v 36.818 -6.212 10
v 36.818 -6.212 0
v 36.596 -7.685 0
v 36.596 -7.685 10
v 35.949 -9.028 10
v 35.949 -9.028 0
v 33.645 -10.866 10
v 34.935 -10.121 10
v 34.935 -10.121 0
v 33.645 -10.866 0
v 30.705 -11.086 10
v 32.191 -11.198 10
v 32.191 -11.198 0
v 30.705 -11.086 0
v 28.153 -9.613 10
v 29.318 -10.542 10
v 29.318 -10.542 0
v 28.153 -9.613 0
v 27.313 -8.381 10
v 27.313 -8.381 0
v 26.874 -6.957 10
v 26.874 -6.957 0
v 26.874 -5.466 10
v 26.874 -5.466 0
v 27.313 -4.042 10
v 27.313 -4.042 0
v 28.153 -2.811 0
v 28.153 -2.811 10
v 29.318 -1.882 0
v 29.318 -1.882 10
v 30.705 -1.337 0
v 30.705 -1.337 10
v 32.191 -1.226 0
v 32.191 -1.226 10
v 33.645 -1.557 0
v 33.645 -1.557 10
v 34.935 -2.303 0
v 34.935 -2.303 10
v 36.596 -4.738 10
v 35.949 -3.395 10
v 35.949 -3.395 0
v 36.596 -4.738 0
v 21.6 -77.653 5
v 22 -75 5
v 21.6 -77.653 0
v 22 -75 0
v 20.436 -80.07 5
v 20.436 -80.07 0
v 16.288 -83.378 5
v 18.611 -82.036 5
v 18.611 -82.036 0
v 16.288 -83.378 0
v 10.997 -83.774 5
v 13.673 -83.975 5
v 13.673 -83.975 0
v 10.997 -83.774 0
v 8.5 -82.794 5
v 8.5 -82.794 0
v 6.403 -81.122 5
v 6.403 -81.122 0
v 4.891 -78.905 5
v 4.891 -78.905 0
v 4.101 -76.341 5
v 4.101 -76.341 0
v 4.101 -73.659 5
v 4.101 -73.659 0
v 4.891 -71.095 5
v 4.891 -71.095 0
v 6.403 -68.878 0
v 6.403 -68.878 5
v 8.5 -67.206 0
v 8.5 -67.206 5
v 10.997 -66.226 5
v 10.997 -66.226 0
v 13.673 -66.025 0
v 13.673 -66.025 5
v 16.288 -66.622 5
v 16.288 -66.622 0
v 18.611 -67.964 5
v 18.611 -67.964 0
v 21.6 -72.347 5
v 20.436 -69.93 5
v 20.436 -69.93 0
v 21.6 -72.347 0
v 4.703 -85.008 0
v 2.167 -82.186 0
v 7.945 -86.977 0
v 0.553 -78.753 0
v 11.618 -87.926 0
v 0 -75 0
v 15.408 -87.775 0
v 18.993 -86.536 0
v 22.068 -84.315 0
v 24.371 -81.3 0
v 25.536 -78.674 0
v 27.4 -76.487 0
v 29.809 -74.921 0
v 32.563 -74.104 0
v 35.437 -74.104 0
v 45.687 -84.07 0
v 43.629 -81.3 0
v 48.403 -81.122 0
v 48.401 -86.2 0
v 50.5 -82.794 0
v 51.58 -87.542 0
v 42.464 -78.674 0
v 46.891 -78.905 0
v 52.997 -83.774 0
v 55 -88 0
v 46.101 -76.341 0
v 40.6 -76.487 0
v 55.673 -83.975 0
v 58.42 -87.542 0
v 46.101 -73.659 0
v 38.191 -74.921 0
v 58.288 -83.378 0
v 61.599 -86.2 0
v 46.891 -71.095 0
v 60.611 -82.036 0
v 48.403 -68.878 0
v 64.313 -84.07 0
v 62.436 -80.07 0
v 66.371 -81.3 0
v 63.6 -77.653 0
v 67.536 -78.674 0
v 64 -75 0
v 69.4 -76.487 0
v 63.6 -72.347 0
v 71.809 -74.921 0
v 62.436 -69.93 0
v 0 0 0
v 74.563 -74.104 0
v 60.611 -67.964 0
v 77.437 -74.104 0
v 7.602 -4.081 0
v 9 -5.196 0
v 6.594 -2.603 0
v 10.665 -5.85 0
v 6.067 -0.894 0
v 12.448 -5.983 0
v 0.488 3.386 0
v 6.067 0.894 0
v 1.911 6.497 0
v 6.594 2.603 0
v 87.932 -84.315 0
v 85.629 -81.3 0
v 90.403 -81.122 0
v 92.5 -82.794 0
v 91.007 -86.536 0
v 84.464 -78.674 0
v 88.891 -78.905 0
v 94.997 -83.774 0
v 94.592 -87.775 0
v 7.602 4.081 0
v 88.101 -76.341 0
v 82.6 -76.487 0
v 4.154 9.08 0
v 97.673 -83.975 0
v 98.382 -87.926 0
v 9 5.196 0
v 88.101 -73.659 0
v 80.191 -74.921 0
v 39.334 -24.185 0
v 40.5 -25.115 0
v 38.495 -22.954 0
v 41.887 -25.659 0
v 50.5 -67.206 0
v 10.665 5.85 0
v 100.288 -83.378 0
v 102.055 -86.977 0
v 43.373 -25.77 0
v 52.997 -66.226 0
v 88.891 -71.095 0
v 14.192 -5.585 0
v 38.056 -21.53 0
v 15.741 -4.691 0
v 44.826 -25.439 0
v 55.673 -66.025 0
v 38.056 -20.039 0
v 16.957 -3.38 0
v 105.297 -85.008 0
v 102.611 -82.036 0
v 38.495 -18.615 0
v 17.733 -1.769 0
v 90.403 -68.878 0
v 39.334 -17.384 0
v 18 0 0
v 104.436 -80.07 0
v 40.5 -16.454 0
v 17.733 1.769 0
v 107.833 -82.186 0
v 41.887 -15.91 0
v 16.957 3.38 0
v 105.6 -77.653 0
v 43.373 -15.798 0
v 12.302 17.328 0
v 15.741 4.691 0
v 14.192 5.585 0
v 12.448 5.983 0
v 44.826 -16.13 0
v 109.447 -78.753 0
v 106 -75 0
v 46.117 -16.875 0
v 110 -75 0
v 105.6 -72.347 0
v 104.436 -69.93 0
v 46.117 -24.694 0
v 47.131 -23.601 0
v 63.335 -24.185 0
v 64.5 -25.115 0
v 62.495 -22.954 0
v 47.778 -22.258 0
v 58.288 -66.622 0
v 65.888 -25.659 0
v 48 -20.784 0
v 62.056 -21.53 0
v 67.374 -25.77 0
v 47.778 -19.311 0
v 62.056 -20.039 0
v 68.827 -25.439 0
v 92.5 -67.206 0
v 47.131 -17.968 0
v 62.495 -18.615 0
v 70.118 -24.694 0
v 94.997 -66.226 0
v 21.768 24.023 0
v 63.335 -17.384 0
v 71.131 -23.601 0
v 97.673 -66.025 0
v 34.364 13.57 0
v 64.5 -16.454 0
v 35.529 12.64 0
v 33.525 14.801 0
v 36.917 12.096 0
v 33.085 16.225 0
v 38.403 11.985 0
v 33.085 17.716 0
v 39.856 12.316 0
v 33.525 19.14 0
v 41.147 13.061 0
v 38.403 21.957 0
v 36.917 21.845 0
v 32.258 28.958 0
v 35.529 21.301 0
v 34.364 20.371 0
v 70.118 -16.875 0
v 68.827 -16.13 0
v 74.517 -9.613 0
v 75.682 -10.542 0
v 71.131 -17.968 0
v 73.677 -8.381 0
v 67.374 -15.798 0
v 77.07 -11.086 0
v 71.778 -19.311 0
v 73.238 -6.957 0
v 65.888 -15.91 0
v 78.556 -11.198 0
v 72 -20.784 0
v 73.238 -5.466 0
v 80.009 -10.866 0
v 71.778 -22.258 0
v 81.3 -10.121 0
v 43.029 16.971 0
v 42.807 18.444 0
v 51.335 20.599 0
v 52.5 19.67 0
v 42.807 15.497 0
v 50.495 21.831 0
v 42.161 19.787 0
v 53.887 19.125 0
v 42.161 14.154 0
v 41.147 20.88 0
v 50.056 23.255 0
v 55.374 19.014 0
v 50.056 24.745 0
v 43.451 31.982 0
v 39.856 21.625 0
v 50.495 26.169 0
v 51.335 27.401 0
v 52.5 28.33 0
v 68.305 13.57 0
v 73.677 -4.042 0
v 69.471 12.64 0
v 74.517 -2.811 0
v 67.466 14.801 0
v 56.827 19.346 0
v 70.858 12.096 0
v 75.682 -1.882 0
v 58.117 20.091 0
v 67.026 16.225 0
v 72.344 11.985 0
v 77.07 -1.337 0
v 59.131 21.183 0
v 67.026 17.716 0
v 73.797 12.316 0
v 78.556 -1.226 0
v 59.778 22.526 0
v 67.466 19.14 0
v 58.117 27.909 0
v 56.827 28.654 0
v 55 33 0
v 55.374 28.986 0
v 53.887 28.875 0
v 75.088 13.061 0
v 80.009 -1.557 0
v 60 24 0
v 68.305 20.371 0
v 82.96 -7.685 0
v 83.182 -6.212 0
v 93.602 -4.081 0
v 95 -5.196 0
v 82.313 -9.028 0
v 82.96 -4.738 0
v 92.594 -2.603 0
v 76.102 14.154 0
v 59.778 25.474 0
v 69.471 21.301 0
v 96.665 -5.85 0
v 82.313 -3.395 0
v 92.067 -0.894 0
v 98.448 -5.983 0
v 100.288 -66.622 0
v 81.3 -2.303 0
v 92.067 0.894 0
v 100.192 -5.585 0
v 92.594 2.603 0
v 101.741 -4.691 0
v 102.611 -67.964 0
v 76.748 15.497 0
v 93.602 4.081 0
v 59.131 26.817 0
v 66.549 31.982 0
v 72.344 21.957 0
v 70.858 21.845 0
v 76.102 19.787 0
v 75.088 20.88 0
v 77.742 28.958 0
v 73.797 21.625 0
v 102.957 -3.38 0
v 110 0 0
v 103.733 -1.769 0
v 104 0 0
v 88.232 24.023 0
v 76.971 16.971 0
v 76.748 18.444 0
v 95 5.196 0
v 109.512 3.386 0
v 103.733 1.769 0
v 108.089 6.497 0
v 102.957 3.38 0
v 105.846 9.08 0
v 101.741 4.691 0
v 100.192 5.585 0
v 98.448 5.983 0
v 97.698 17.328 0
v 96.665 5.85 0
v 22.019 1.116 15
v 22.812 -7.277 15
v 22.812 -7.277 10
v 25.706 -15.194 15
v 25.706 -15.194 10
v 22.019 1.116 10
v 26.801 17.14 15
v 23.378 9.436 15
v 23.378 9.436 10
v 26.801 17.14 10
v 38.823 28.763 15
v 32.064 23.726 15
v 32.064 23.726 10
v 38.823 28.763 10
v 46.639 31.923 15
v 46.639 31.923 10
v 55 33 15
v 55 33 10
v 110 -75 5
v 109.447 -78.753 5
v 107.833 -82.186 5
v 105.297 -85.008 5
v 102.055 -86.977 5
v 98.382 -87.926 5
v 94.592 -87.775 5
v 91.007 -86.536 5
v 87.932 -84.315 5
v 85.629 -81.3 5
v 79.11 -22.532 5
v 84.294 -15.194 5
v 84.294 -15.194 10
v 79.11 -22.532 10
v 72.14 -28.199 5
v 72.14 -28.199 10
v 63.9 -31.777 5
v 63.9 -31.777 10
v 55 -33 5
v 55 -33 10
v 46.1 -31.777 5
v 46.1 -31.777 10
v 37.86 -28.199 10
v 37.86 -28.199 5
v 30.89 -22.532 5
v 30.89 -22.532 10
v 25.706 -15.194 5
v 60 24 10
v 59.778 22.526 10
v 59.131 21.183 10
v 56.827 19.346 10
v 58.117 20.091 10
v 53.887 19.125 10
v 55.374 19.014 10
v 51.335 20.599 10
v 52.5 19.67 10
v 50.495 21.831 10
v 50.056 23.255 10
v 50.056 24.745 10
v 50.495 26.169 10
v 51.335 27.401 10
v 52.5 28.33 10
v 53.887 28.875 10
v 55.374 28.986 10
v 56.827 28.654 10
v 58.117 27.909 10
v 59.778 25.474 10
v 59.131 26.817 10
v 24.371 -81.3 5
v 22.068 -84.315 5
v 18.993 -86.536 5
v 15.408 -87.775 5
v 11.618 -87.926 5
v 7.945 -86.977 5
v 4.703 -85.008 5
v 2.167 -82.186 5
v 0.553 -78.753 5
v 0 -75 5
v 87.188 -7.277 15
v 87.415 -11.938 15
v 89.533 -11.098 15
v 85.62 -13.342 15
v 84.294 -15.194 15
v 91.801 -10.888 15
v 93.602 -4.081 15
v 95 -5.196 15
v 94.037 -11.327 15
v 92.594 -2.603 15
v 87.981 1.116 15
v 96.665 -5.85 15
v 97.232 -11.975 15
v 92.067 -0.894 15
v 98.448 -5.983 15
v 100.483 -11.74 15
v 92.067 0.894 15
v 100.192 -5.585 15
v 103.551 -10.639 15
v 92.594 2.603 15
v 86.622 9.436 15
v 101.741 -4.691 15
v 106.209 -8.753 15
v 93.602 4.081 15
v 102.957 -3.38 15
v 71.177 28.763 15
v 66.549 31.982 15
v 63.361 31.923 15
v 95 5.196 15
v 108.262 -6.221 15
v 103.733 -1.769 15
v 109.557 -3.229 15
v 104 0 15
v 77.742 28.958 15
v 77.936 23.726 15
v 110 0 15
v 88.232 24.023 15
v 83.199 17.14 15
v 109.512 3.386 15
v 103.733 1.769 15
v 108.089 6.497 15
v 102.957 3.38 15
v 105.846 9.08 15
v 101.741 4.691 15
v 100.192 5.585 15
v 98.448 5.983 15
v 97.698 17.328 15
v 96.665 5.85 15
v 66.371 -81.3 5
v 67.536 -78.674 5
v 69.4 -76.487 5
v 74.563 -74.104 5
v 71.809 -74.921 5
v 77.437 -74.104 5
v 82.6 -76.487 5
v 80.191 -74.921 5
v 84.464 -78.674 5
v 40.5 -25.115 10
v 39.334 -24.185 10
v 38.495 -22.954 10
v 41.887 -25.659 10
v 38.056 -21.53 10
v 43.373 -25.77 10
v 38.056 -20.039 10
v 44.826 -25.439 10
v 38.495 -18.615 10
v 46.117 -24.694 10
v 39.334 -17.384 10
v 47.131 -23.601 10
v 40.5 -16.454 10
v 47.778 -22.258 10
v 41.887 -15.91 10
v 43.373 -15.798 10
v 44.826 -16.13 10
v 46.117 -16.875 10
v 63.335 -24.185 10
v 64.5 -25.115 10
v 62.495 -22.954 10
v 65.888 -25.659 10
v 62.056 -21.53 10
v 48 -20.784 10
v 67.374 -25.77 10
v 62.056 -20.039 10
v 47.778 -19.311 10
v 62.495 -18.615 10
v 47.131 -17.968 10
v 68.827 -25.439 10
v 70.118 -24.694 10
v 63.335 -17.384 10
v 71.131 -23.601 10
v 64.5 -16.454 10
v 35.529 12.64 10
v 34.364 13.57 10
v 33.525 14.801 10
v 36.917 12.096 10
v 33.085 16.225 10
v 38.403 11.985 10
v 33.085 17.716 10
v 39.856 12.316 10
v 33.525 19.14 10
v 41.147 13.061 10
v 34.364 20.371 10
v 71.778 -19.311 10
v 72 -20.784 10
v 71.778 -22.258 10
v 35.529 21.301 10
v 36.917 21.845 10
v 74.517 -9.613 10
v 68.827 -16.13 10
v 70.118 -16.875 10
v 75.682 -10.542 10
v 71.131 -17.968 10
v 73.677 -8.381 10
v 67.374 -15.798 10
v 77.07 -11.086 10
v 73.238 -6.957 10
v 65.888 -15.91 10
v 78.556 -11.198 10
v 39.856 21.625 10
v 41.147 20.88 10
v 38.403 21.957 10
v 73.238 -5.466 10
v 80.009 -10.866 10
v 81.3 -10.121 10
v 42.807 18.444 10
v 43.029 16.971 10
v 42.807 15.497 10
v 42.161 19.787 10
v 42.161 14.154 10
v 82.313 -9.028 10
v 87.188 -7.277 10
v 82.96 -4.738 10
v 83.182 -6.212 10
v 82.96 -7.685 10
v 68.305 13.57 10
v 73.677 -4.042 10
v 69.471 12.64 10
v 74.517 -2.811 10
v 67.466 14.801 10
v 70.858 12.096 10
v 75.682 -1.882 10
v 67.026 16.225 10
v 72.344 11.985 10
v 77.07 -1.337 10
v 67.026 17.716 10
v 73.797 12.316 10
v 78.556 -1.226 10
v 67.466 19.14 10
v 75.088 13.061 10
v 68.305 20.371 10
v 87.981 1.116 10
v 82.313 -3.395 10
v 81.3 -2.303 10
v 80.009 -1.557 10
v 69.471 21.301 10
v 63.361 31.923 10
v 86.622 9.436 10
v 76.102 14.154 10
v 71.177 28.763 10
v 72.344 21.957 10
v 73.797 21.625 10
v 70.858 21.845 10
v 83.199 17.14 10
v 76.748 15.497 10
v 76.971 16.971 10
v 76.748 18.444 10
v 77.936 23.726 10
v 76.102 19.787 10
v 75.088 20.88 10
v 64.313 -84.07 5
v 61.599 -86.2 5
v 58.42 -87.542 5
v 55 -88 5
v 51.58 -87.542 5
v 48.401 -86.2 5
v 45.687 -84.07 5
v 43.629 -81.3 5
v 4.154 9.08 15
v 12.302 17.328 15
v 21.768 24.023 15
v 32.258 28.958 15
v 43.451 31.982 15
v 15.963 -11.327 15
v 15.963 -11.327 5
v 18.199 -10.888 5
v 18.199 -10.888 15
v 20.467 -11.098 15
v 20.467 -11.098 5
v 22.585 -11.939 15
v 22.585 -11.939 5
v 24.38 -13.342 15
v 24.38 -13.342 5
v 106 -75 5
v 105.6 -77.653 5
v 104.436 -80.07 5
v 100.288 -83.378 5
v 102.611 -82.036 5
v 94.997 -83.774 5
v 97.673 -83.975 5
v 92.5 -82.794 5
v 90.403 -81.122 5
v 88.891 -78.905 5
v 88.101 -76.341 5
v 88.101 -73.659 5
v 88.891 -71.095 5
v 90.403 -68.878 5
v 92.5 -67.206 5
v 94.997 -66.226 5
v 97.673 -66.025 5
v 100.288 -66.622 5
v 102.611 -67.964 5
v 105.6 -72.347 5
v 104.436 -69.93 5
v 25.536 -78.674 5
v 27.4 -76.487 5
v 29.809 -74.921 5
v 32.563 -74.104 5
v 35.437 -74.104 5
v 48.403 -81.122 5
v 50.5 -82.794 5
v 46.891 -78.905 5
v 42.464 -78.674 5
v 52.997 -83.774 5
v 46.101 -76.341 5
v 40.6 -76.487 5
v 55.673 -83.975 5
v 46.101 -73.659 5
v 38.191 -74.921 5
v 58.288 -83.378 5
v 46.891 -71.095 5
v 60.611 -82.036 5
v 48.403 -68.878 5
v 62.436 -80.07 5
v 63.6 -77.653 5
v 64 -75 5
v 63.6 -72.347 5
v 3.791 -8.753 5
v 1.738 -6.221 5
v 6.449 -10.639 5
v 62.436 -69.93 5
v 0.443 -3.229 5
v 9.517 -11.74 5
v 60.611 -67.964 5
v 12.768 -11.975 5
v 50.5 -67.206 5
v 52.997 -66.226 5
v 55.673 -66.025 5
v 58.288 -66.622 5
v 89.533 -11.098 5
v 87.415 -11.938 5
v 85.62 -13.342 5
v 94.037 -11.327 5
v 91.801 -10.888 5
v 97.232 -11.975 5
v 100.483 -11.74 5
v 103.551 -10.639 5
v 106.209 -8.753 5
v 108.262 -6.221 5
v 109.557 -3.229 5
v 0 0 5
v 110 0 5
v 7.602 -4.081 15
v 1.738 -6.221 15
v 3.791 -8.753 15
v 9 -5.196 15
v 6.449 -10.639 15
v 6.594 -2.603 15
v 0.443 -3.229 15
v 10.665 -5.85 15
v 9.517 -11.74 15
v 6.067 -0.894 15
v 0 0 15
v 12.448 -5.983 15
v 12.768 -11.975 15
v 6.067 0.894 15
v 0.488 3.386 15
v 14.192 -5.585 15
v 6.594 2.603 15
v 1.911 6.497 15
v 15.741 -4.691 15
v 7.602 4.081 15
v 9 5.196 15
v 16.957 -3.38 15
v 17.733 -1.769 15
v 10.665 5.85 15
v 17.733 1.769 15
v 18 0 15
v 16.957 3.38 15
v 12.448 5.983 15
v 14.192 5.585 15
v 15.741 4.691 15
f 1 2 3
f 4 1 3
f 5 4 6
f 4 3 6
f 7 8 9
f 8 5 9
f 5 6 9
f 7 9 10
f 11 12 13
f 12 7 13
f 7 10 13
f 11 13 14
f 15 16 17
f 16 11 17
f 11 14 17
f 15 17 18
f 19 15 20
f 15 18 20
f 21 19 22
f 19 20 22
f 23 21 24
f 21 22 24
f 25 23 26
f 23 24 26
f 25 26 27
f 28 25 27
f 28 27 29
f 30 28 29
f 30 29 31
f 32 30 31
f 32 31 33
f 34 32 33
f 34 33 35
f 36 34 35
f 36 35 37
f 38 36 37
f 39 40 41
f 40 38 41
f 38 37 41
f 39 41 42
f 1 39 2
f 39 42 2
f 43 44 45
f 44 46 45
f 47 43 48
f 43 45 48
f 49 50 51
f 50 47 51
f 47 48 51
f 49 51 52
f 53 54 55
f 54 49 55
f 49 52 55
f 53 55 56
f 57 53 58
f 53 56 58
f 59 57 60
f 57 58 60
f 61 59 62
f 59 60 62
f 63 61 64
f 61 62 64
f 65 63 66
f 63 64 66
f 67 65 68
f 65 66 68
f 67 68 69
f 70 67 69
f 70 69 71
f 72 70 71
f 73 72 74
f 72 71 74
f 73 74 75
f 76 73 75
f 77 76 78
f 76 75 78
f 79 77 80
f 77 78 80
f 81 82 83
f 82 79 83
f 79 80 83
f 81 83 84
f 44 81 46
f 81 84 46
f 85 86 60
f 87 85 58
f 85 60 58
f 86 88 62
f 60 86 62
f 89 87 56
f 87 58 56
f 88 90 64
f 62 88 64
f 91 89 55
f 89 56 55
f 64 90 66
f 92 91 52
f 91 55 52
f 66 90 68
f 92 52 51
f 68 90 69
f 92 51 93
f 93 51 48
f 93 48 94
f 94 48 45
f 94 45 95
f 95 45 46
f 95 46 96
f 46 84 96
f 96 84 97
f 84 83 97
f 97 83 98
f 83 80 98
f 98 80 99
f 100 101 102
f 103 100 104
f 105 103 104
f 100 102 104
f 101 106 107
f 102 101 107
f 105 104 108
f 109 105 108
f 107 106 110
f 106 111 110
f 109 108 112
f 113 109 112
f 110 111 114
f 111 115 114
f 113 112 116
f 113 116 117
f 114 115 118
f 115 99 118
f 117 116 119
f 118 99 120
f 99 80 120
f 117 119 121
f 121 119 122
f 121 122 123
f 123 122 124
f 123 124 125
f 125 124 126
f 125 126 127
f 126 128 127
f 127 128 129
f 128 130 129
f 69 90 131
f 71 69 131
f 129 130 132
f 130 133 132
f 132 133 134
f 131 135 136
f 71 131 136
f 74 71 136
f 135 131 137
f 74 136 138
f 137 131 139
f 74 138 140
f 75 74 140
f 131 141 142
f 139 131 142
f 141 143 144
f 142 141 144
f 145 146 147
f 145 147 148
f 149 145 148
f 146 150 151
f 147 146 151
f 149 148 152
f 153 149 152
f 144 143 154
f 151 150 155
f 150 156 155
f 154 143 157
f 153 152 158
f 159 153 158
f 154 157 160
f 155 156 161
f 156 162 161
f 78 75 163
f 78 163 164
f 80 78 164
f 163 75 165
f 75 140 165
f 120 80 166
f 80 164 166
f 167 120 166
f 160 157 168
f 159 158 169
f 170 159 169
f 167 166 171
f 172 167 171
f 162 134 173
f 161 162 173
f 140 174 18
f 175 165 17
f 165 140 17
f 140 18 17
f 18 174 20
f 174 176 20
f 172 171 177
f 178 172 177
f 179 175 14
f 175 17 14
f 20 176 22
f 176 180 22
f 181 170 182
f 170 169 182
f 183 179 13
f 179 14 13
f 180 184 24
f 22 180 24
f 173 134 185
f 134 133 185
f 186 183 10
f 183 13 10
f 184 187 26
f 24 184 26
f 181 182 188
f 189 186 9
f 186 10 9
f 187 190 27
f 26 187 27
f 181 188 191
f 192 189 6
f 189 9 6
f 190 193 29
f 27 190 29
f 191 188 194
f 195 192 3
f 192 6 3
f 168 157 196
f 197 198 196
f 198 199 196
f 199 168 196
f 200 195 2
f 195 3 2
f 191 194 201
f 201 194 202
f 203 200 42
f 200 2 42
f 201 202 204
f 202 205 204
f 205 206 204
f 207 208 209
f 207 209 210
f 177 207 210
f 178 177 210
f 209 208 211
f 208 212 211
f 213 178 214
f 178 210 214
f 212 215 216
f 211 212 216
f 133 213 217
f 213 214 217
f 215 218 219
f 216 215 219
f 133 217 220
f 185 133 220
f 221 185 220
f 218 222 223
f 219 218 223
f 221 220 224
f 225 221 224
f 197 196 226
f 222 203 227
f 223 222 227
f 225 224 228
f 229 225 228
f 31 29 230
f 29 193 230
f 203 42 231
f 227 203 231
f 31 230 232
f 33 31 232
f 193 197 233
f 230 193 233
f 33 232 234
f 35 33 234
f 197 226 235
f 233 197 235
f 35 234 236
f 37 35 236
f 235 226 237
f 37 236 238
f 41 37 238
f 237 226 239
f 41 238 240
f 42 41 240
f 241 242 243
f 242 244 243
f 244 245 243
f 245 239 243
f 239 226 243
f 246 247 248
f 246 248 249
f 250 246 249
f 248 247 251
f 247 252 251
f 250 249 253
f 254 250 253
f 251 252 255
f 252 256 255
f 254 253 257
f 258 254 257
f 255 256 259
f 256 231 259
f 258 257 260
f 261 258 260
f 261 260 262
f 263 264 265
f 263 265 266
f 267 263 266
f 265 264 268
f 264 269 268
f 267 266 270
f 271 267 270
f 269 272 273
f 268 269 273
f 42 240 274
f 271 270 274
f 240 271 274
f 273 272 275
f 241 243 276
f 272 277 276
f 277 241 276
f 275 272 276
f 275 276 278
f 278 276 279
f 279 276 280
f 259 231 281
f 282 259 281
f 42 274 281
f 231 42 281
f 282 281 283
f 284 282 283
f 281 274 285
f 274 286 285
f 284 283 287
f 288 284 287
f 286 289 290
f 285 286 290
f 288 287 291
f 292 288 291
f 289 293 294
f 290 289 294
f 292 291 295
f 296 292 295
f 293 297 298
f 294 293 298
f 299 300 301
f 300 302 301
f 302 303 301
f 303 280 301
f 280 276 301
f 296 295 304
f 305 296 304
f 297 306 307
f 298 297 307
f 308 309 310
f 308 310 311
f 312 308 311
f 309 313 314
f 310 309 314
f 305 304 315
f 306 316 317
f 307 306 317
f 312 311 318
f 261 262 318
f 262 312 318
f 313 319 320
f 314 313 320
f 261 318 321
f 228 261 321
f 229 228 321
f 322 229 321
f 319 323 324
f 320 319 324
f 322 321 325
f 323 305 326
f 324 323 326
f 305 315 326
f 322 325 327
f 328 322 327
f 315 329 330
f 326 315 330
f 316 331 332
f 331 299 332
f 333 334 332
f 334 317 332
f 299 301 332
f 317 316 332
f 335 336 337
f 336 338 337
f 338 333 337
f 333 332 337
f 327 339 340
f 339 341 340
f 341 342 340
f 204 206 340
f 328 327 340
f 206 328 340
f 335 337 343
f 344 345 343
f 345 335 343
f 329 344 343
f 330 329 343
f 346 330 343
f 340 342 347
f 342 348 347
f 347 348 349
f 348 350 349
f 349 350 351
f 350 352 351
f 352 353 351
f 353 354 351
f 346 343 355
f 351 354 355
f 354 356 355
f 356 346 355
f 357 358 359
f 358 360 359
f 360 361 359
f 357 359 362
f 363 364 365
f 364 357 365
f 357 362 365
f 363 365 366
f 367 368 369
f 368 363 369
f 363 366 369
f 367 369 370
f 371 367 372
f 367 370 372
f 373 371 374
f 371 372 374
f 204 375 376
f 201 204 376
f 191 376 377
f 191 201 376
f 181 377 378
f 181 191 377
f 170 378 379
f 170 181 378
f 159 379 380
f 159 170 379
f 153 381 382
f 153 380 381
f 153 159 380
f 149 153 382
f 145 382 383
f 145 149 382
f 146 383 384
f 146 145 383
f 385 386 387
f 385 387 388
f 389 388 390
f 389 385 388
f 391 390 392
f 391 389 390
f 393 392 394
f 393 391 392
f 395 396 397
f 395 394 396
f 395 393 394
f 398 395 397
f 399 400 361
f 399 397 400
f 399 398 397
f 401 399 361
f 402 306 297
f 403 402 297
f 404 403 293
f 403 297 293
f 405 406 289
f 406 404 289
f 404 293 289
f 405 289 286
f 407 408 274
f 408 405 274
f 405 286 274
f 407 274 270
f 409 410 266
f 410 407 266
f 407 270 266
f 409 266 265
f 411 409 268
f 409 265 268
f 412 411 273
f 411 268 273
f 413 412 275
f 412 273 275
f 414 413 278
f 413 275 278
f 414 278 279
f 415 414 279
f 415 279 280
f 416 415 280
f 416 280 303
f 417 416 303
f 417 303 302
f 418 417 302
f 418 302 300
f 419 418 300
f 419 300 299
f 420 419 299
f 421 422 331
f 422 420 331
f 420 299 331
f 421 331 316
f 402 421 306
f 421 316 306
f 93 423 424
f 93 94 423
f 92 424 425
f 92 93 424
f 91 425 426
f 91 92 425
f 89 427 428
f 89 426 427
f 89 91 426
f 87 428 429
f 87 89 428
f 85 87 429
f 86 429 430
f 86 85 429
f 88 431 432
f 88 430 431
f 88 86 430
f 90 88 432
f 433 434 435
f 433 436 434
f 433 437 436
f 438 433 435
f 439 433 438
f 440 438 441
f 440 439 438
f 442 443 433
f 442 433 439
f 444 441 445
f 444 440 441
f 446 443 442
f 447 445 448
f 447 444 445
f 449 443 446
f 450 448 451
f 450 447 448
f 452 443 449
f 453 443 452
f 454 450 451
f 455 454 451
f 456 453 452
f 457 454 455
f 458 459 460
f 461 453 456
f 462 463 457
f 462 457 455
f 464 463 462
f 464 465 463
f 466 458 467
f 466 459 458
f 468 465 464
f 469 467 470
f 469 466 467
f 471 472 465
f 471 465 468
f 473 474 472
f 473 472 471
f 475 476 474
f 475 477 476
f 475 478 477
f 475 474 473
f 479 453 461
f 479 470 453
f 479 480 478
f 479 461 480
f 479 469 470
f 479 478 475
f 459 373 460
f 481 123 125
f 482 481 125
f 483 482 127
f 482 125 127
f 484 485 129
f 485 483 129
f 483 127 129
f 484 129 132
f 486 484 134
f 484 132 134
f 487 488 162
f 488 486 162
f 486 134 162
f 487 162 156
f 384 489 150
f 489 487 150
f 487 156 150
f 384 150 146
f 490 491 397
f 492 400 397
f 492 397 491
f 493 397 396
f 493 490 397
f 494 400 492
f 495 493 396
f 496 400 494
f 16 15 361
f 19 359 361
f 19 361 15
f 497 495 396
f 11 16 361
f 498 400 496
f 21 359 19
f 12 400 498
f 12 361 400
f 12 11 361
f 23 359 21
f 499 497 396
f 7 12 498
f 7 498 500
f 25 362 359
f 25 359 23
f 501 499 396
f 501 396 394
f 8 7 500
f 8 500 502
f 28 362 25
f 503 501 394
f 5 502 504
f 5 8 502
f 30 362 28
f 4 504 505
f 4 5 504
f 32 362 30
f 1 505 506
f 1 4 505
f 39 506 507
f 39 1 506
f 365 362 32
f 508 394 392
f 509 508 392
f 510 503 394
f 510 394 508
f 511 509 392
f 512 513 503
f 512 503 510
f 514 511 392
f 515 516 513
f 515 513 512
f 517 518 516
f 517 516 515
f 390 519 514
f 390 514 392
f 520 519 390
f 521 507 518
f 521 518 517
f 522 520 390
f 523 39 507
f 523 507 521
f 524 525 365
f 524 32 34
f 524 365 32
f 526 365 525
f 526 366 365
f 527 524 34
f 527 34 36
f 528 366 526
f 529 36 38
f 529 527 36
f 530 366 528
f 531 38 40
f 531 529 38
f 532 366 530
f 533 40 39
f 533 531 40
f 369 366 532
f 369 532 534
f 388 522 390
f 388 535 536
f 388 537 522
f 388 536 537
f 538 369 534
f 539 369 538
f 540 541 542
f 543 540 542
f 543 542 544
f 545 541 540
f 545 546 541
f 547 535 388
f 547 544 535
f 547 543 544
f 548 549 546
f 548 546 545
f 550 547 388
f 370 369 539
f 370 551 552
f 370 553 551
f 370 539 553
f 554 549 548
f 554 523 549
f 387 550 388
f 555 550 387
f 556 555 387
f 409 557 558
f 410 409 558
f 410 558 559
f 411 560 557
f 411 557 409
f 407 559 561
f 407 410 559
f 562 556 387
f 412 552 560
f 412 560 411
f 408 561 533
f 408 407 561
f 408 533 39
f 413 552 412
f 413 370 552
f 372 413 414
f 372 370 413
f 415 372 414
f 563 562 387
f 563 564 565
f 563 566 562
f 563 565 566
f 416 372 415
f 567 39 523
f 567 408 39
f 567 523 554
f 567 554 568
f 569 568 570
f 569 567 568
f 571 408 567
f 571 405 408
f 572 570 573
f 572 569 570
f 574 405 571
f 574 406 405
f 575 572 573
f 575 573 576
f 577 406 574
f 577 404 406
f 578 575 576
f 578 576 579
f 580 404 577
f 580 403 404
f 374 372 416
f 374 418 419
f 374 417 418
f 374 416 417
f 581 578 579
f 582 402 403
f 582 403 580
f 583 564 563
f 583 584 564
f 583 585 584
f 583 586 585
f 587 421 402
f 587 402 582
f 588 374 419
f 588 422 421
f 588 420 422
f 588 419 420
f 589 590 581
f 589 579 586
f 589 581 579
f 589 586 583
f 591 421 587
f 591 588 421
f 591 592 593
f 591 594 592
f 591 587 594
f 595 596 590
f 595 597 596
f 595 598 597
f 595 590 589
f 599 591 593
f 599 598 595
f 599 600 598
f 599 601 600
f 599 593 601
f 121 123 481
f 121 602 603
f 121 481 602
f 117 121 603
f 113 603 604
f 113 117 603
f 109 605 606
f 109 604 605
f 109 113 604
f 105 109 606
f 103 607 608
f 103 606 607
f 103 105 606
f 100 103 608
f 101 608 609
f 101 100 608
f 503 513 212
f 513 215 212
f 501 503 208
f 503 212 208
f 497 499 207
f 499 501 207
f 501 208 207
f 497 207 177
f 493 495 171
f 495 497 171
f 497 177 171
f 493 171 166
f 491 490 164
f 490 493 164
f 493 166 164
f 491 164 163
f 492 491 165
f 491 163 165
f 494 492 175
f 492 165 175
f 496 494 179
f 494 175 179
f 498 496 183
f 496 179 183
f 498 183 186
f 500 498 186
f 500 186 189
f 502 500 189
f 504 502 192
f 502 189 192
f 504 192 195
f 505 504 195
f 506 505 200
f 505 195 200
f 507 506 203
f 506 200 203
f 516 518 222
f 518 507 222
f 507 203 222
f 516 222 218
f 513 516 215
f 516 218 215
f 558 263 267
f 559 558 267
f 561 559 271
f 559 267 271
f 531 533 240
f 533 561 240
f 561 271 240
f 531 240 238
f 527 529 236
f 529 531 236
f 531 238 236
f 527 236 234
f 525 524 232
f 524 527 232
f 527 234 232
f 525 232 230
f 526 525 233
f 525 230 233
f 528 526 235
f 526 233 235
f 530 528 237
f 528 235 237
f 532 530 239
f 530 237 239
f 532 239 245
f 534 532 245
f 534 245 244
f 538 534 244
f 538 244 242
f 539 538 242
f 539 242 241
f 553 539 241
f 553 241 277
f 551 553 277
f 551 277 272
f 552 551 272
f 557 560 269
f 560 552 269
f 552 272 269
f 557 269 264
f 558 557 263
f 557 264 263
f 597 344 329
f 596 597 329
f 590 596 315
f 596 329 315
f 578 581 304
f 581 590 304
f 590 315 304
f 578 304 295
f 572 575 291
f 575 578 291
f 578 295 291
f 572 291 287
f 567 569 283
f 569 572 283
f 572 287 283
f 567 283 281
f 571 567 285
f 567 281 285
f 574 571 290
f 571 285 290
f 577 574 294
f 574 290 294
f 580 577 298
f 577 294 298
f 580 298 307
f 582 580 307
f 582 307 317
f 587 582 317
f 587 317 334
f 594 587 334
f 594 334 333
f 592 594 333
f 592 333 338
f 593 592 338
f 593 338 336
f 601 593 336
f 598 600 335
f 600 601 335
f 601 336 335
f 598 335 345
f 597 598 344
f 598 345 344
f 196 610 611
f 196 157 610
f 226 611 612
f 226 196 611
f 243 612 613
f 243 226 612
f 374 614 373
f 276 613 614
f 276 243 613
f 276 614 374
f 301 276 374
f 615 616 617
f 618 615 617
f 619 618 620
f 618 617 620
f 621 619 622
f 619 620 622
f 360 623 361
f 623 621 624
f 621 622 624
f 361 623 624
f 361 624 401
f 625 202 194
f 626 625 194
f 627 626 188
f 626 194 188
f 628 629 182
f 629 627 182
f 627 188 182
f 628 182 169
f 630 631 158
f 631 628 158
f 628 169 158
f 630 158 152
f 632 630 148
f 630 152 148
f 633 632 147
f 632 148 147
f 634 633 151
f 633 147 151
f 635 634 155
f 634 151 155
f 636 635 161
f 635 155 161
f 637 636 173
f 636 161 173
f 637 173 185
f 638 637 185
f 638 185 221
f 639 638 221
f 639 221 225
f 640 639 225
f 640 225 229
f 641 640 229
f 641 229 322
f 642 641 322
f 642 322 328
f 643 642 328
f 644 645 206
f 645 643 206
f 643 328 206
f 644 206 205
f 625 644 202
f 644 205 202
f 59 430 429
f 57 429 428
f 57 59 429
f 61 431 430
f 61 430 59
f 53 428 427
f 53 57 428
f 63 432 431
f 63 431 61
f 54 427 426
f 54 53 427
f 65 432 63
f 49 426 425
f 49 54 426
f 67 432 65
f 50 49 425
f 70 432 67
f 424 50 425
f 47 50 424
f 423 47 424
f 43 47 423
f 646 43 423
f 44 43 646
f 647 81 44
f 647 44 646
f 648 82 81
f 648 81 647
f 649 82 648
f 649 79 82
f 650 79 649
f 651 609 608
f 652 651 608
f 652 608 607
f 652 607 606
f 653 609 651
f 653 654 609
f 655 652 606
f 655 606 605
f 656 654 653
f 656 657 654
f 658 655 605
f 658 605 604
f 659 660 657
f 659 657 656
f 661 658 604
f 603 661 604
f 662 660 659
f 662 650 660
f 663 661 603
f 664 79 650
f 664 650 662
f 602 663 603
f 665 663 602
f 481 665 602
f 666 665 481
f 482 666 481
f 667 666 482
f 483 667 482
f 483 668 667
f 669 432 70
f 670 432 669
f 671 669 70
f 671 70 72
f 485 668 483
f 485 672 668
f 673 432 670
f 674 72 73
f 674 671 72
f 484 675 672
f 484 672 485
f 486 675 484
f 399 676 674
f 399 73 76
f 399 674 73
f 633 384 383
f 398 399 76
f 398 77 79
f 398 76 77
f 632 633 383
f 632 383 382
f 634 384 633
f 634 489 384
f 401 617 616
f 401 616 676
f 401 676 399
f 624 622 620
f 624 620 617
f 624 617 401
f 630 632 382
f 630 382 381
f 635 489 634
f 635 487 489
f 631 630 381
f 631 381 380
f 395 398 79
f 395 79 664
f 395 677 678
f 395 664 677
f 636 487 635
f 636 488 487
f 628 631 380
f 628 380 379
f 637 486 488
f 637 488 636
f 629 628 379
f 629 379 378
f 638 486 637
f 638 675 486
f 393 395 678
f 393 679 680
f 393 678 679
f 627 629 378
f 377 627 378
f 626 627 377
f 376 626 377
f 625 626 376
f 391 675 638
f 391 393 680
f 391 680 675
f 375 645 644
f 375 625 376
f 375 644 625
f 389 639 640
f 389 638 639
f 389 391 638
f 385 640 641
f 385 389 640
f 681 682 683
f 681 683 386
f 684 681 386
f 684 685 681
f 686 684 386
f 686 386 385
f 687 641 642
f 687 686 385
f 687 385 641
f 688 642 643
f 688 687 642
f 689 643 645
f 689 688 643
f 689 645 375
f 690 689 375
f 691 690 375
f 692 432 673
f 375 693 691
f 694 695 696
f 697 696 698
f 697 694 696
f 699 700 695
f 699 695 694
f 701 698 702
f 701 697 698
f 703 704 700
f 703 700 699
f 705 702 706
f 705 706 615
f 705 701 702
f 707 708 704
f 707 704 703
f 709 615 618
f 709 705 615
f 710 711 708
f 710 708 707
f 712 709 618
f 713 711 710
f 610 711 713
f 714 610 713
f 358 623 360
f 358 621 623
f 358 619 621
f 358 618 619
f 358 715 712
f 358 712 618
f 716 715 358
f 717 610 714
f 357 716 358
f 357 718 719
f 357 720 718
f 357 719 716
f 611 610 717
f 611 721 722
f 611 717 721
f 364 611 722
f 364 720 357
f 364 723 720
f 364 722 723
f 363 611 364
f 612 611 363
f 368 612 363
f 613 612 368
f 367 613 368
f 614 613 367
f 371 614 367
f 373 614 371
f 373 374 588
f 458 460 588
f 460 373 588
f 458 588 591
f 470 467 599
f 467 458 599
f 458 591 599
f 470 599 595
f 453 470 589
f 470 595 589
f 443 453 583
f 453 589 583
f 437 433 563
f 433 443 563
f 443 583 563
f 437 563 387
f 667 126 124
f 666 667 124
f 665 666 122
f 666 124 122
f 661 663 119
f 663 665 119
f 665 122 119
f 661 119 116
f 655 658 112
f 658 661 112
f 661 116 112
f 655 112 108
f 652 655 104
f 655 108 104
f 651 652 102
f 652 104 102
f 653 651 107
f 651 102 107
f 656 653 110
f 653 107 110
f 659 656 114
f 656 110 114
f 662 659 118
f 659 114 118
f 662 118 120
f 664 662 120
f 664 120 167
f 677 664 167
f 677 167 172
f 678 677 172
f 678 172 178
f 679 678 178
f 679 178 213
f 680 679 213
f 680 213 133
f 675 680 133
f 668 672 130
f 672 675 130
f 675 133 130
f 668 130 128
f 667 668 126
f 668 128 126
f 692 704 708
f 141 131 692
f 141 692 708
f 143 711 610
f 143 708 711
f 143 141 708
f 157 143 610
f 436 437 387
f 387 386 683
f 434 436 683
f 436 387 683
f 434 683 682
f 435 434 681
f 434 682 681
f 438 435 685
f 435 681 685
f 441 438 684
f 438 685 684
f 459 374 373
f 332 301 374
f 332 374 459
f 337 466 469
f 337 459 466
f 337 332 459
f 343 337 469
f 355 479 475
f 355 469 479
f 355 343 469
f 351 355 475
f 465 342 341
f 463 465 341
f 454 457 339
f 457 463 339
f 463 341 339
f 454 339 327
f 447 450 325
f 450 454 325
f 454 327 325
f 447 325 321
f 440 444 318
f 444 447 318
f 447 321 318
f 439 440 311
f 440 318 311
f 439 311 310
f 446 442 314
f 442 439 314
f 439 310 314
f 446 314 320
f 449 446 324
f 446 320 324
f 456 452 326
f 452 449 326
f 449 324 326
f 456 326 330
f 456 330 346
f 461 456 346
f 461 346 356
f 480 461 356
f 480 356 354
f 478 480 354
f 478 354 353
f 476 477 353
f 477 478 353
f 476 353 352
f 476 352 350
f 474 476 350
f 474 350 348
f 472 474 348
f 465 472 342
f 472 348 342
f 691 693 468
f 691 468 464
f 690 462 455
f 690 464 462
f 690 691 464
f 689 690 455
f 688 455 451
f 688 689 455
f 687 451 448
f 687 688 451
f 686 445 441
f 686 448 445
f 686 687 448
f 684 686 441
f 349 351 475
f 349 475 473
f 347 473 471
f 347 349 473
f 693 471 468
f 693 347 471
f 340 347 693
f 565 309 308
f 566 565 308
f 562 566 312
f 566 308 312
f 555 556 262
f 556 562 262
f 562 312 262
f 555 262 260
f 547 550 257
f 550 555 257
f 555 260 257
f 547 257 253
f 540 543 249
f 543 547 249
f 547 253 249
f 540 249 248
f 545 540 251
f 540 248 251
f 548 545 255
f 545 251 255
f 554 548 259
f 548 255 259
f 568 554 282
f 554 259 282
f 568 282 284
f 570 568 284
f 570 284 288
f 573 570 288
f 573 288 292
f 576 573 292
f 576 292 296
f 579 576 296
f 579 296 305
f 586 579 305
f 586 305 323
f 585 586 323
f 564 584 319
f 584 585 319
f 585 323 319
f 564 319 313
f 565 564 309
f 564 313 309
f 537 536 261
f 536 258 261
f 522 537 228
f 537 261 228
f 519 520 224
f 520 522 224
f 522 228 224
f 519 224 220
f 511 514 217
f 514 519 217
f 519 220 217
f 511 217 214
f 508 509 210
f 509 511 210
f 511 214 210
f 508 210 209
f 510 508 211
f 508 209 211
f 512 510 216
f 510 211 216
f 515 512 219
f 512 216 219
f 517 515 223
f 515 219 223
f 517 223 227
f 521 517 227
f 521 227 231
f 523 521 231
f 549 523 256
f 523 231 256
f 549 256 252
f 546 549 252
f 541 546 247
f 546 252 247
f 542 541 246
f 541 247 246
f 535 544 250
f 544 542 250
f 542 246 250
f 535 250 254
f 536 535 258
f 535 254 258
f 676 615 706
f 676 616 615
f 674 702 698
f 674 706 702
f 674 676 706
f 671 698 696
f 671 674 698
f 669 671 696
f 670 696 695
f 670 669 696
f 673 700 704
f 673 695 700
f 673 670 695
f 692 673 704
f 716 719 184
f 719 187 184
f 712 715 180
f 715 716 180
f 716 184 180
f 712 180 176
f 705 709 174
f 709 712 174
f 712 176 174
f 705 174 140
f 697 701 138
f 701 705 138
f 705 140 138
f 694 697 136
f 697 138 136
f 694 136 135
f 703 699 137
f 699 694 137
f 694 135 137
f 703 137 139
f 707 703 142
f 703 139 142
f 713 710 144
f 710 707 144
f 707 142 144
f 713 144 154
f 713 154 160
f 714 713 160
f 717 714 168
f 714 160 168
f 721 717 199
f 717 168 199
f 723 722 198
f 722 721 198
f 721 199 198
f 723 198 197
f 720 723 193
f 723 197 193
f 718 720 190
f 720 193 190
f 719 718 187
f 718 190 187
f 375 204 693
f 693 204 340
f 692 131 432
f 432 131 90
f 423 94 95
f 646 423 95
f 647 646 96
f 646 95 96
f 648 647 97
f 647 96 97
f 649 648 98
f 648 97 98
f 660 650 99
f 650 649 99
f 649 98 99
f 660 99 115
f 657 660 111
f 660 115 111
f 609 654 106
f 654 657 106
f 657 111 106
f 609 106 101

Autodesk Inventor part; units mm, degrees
ref_plane "YZ Plane" through (0, 0, 0) normal (1, 0, 0) x (0, 1, 0)
ref_plane "XZ Plane" through (0, 0, 0) normal (0, 1, 0) x (-1, 0, 0)
ref_plane "XY Plane" through (0, 0, 0) normal (0, 0, 1) x (1, 0, 0)
sketch "Эскиз1" plane through (0, 0, 0) normal (0, 0, 1) x (1, 0, 0)
  line L0 (0, 0) -> (110, 0) construction
  line L1 (110, 0) -> (55, 0) construction
  circle A0 centre (55, 0) radius 33
  line L2 (22, 0) -> (88, 0) construction
  line L3 (55, 0) -> (55, 33) construction
  line L4 (55, 0) -> (55, -33) construction
  circle A1 centre (55, 0) radius 24 construction
  circle A2 centre (55, 24) radius 5
  line L5 (55, 0) -> (71.9706, 16.9706) construction
  line L6 (71.9706, 16.9706) -> (38.0294, 16.9706) construction
  line L7 (55, 0) -> (38.0294, 16.9706) construction
  circle A3 centre (71.9706, 16.9706) radius 5
  circle A4 centre (38.0294, 16.9706) radius 5
  line L8 (55, 0) -> (78.1822, -6.2117) construction
  circle A5 centre (78.1822, -6.2117) radius 5
  line L9 (55, 0) -> (67.0003, -20.7844) construction
  circle A6 centre (67.0003, -20.7844) radius 5
  line L10 (55, 0) -> (42.9997, -20.7844) construction
  line L11 (78.1822, -6.2117) -> (31.8178, -6.2117) construction
  line L12 (31.8178, -6.2117) -> (55, 0) construction
  circle A7 centre (42.9997, -20.7844) radius 5
  circle A8 centre (31.8178, -6.2117) radius 5
  line L13 (0, 0) -> (12, 0) construction
  circle A9 centre (12, 0) radius 6
  line L14 (110, 0) -> (98, 0) construction
  circle A10 centre (98, 0) radius 6
  arc A11 (110, 0) -> (105.8455, 9.0801) centre (98, 0) ccw
  arc A12 (4.1545, 9.0801) -> (0, 0) centre (12, 0) ccw
  arc A13 (105.8455, 9.0801) -> (4.1545, 9.0801) centre (55, -33) ccw
  line L15 (0, 0) -> (0, -75)
  line L16 (0, -75) -> (110, -75) construction
  line L17 (110, -75) -> (110, 0)
  line L18 (55, 33) -> (55, -75) construction
  line L19 (110, -75) -> (97, -75) construction
  line L20 (0, -75) -> (13, -75) construction
  circle A14 centre (55, -75) radius 9
  circle A15 centre (13, -75) radius 9
  circle A16 centre (97, -75) radius 9
  line L21 (97, -75) -> (97, -88) construction
  line L22 (97, -88) -> (13, -88) construction
  line L23 (84, -75) -> (76, -75) construction
  line L24 (76, -75) -> (76, -84) construction
  arc A17 (85.6287, -81.3002) -> (110, -75) centre (97, -75) ccw
  arc A18 (85.6287, -81.3002) -> (66.3713, -81.3002) centre (76, -84) ccw
  arc A19 (43.6287, -81.3002) -> (66.3713, -81.3002) centre (55, -75) ccw
  line L25 (42, -75) -> (34, -75) construction
  line L26 (34, -75) -> (34, -84) construction
  line L27 (34, -84) -> (76, -84) construction
  arc A20 (43.6287, -81.3002) -> (24.3713, -81.3002) centre (34, -84) ccw
  arc A21 (0, -75) -> (24.3713, -81.3002) centre (13, -75) ccw
  arc A22 (0, 0) -> (15.9628, -11.3268) centre (12, 0) ccw
  arc A23 (25.7062, -15.1945) -> (15.9628, -11.3268) centre (18.6047, -18.878) ccw
  arc A24 (94.0372, -11.3268) -> (110, 0) centre (98, 0) ccw
  arc A25 (94.0372, -11.3268) -> (84.2938, -15.1945) centre (91.3953, -18.878) ccw
  dimension "d3" = 48
  dimension "d0" = 110
  dimension "d1" = 55
  dimension "d2" = 66
  dimension "d4" = 10
  dimension "d7" = 10
  dimension "d8" = 10
  dimension "d11" = 10
  dimension "d12" = 10
  dimension "d13" = 15
  dimension "d14" = 59.999
  dimension "d15" = 120.001
  dimension "d16" = 10
  dimension "d17" = 10
  dimension "d18" = 12
  dimension "d19" = 12
  dimension "d20" = 12
  dimension "d21" = 12
  dimension "d26" = 75
  dimension "d60" = 10
  dimension "d63" = 10
  dimension "d64" = 13
  dimension "d65" = 18
  dimension "d66" = 34
  dimension "d67" = 76
  dimension "d68" = 24.3713
  dimension "d69" = 26
  dimension "d70" = 9
  dimension "d71" = 68
  dimension "d72" = 97
  dimension "d77" = 8
extrude "Выдавливание1" add sketch "Эскиз1" along normal blind 10 contours A0
extrude "Выдавливание2" add sketch "Эскиз1" along normal blind 15 contours A23 A22 A12 A13 A0 | A0 A13 A11 A24 A25
extrude "Выдавливание3" add sketch "Эскиз1" along normal blind 5 contours A0 A25 A24 L17 A17 A18 A19 A20 A21 L15 A22 A23
properties part number "лаб2"
